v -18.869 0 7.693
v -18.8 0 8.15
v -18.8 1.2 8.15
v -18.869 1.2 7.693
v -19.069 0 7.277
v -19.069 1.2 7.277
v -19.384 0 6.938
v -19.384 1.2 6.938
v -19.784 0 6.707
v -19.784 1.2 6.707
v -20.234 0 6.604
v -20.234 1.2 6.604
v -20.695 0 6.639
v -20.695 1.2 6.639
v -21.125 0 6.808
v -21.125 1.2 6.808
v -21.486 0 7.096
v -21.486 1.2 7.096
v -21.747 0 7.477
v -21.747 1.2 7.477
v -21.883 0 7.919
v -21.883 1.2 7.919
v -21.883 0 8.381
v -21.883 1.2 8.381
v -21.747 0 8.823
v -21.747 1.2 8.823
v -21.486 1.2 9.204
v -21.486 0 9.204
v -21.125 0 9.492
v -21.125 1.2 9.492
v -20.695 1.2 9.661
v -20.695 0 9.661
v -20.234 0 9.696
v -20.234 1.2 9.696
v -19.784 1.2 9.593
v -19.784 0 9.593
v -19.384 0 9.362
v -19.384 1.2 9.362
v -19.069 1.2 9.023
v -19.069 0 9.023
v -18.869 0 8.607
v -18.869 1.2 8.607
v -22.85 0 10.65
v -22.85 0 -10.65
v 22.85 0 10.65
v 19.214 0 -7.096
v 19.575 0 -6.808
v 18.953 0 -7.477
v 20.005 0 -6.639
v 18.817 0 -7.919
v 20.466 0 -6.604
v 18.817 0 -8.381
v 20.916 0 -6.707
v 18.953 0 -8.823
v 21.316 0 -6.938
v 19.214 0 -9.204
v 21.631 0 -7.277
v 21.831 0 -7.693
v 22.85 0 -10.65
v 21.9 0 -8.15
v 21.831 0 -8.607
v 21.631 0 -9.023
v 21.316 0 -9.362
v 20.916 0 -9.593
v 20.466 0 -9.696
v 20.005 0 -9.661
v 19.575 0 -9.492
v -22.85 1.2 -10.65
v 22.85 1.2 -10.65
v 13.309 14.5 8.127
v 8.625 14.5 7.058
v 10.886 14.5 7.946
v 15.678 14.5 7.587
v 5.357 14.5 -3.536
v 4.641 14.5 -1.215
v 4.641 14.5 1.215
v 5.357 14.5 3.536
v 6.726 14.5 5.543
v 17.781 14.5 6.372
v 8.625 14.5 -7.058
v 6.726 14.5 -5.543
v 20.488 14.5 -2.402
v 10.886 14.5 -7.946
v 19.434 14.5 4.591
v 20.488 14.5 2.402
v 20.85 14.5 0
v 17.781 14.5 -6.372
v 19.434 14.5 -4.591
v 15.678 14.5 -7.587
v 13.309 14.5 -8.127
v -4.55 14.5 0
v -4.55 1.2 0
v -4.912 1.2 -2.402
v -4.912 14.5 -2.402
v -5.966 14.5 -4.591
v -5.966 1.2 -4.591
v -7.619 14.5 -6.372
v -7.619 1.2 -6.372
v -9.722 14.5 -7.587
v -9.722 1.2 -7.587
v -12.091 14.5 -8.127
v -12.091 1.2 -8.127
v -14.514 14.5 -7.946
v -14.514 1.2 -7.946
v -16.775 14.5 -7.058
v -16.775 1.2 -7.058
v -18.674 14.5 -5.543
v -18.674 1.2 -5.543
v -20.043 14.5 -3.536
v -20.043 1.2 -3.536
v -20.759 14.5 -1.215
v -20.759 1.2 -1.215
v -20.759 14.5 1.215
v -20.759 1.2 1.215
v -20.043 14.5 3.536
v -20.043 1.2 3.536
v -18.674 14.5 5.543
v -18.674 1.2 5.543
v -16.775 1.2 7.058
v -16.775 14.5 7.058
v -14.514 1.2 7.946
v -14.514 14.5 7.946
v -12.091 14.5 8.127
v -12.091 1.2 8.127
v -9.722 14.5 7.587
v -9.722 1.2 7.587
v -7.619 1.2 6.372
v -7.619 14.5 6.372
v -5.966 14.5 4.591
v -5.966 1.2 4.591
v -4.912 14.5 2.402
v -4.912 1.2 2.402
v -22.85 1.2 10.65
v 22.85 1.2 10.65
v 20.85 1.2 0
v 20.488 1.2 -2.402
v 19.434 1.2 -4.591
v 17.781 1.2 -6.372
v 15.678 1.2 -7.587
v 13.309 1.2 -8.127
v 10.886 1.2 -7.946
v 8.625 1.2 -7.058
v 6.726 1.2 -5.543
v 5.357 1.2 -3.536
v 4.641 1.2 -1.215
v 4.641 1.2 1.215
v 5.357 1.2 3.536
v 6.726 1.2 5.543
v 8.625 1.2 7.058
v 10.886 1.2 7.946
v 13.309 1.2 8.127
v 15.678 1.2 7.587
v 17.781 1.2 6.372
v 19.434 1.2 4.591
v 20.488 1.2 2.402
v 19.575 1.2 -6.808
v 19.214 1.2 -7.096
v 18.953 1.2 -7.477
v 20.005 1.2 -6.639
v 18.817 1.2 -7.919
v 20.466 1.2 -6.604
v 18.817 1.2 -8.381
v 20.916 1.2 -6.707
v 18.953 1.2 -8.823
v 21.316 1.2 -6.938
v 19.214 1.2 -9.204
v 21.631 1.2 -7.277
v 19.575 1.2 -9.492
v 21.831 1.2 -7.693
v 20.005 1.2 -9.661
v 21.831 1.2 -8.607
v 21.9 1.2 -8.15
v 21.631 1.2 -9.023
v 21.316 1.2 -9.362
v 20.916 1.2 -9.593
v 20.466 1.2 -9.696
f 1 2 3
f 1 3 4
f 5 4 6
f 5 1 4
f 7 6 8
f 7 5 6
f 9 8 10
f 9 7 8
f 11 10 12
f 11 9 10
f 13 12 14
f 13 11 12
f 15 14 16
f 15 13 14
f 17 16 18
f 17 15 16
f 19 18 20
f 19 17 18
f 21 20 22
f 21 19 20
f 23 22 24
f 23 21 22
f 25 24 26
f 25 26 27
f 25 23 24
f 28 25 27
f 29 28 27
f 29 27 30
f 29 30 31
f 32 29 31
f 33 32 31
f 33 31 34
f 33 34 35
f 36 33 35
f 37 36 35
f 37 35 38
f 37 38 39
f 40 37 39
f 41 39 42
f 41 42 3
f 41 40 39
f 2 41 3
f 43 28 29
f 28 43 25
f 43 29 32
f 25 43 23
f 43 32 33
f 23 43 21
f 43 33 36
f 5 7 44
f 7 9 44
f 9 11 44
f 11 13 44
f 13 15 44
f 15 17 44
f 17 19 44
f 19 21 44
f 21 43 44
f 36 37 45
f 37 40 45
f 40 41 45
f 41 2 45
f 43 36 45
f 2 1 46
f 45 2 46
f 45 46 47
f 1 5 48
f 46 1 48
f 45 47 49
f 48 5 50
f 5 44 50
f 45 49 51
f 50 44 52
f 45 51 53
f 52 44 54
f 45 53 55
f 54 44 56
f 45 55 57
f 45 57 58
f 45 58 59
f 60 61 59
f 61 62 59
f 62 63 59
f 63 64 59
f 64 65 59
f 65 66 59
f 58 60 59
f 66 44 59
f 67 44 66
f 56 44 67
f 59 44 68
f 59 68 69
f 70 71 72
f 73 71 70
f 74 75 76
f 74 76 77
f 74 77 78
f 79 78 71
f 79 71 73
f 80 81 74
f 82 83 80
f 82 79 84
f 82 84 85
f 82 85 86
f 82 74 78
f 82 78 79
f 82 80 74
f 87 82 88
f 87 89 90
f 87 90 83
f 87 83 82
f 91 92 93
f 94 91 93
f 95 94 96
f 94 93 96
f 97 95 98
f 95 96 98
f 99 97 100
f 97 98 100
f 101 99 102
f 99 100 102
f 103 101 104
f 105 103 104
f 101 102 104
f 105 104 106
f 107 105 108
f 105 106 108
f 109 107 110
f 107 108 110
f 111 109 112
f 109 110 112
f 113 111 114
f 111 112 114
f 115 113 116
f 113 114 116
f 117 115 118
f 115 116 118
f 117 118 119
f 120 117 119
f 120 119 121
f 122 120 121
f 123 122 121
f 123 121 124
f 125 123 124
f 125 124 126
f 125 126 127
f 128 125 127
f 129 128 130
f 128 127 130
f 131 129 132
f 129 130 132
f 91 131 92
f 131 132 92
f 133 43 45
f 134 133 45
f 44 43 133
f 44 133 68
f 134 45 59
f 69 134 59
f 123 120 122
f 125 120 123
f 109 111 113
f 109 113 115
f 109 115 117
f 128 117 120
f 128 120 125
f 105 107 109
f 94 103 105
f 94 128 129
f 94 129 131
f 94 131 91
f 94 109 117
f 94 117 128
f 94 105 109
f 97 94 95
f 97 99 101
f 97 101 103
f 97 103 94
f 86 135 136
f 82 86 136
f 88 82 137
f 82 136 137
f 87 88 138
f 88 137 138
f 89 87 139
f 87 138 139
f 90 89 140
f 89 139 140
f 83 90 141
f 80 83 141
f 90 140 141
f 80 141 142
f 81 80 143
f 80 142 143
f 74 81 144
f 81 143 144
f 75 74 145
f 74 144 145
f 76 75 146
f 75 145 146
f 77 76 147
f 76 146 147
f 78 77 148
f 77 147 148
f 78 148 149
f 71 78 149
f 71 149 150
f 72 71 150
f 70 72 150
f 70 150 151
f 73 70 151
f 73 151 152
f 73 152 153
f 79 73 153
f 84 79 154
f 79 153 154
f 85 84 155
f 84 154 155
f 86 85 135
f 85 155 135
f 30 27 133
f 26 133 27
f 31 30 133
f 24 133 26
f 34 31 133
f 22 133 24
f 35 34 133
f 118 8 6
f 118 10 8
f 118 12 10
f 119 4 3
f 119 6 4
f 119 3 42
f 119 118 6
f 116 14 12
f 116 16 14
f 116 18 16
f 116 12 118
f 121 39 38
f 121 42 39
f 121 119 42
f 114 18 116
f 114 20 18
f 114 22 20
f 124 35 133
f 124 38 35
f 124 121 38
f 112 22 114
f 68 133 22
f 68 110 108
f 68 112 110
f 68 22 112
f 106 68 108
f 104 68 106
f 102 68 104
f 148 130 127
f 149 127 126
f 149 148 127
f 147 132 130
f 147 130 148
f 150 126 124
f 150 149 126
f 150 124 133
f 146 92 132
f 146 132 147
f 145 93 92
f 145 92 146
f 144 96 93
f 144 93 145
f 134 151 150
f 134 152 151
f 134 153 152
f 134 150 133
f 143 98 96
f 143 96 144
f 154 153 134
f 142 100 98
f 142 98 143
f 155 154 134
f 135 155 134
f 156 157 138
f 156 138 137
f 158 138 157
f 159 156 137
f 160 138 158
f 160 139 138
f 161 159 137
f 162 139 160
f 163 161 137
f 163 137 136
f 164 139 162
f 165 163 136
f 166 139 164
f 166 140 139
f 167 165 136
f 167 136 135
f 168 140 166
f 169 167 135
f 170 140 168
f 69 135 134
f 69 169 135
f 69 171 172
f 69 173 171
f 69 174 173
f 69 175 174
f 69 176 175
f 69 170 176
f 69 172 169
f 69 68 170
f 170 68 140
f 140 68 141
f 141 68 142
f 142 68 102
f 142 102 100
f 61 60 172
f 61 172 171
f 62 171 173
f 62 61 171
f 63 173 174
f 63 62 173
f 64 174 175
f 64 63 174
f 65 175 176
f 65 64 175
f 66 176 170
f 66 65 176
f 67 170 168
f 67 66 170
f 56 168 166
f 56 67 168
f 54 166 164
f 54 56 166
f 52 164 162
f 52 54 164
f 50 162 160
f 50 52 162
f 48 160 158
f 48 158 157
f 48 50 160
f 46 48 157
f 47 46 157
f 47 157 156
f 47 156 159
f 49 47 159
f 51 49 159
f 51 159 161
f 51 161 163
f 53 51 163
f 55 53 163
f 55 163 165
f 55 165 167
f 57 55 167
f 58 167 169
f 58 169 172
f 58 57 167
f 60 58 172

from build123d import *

# Parameters (mm, degrees)
SKETCH1_W           = 45.7
SKETCH1_H           = 21.3
SKETCH1_R           = 1.55
BOSS_EXTRUDE1_DEPTH = 1.2
SKETCH2_R           = 8.15
BOSS_EXTRUDE2_DEPTH = 13.3


with BuildPart() as part:
    # Sketch1 → Boss-Extrude1 (new body)
    with BuildSketch(Plane(origin=(0, 0, 0), x_dir=(1, 0, 0), z_dir=(0, 1, 0))):
        Rectangle(SKETCH1_W, SKETCH1_H)
        with Locations((20.35, 8.15)):
            Circle(SKETCH1_R, mode=Mode.SUBTRACT)
        with Locations((-20.35, -8.15)):
            Circle(SKETCH1_R, mode=Mode.SUBTRACT)
    extrude(amount=BOSS_EXTRUDE1_DEPTH)

    # Sketch2 → Boss-Extrude2 (add)
    with BuildSketch(Plane(origin=(0, 1.2, 0), x_dir=(1, 0, 0), z_dir=(0, 1, 0))):
        with Locations((-12.7, 0)):
            Circle(SKETCH2_R)
        with Locations((12.7, 0)):
            Circle(SKETCH2_R)
    extrude(amount=BOSS_EXTRUDE2_DEPTH)


solid = part.part
